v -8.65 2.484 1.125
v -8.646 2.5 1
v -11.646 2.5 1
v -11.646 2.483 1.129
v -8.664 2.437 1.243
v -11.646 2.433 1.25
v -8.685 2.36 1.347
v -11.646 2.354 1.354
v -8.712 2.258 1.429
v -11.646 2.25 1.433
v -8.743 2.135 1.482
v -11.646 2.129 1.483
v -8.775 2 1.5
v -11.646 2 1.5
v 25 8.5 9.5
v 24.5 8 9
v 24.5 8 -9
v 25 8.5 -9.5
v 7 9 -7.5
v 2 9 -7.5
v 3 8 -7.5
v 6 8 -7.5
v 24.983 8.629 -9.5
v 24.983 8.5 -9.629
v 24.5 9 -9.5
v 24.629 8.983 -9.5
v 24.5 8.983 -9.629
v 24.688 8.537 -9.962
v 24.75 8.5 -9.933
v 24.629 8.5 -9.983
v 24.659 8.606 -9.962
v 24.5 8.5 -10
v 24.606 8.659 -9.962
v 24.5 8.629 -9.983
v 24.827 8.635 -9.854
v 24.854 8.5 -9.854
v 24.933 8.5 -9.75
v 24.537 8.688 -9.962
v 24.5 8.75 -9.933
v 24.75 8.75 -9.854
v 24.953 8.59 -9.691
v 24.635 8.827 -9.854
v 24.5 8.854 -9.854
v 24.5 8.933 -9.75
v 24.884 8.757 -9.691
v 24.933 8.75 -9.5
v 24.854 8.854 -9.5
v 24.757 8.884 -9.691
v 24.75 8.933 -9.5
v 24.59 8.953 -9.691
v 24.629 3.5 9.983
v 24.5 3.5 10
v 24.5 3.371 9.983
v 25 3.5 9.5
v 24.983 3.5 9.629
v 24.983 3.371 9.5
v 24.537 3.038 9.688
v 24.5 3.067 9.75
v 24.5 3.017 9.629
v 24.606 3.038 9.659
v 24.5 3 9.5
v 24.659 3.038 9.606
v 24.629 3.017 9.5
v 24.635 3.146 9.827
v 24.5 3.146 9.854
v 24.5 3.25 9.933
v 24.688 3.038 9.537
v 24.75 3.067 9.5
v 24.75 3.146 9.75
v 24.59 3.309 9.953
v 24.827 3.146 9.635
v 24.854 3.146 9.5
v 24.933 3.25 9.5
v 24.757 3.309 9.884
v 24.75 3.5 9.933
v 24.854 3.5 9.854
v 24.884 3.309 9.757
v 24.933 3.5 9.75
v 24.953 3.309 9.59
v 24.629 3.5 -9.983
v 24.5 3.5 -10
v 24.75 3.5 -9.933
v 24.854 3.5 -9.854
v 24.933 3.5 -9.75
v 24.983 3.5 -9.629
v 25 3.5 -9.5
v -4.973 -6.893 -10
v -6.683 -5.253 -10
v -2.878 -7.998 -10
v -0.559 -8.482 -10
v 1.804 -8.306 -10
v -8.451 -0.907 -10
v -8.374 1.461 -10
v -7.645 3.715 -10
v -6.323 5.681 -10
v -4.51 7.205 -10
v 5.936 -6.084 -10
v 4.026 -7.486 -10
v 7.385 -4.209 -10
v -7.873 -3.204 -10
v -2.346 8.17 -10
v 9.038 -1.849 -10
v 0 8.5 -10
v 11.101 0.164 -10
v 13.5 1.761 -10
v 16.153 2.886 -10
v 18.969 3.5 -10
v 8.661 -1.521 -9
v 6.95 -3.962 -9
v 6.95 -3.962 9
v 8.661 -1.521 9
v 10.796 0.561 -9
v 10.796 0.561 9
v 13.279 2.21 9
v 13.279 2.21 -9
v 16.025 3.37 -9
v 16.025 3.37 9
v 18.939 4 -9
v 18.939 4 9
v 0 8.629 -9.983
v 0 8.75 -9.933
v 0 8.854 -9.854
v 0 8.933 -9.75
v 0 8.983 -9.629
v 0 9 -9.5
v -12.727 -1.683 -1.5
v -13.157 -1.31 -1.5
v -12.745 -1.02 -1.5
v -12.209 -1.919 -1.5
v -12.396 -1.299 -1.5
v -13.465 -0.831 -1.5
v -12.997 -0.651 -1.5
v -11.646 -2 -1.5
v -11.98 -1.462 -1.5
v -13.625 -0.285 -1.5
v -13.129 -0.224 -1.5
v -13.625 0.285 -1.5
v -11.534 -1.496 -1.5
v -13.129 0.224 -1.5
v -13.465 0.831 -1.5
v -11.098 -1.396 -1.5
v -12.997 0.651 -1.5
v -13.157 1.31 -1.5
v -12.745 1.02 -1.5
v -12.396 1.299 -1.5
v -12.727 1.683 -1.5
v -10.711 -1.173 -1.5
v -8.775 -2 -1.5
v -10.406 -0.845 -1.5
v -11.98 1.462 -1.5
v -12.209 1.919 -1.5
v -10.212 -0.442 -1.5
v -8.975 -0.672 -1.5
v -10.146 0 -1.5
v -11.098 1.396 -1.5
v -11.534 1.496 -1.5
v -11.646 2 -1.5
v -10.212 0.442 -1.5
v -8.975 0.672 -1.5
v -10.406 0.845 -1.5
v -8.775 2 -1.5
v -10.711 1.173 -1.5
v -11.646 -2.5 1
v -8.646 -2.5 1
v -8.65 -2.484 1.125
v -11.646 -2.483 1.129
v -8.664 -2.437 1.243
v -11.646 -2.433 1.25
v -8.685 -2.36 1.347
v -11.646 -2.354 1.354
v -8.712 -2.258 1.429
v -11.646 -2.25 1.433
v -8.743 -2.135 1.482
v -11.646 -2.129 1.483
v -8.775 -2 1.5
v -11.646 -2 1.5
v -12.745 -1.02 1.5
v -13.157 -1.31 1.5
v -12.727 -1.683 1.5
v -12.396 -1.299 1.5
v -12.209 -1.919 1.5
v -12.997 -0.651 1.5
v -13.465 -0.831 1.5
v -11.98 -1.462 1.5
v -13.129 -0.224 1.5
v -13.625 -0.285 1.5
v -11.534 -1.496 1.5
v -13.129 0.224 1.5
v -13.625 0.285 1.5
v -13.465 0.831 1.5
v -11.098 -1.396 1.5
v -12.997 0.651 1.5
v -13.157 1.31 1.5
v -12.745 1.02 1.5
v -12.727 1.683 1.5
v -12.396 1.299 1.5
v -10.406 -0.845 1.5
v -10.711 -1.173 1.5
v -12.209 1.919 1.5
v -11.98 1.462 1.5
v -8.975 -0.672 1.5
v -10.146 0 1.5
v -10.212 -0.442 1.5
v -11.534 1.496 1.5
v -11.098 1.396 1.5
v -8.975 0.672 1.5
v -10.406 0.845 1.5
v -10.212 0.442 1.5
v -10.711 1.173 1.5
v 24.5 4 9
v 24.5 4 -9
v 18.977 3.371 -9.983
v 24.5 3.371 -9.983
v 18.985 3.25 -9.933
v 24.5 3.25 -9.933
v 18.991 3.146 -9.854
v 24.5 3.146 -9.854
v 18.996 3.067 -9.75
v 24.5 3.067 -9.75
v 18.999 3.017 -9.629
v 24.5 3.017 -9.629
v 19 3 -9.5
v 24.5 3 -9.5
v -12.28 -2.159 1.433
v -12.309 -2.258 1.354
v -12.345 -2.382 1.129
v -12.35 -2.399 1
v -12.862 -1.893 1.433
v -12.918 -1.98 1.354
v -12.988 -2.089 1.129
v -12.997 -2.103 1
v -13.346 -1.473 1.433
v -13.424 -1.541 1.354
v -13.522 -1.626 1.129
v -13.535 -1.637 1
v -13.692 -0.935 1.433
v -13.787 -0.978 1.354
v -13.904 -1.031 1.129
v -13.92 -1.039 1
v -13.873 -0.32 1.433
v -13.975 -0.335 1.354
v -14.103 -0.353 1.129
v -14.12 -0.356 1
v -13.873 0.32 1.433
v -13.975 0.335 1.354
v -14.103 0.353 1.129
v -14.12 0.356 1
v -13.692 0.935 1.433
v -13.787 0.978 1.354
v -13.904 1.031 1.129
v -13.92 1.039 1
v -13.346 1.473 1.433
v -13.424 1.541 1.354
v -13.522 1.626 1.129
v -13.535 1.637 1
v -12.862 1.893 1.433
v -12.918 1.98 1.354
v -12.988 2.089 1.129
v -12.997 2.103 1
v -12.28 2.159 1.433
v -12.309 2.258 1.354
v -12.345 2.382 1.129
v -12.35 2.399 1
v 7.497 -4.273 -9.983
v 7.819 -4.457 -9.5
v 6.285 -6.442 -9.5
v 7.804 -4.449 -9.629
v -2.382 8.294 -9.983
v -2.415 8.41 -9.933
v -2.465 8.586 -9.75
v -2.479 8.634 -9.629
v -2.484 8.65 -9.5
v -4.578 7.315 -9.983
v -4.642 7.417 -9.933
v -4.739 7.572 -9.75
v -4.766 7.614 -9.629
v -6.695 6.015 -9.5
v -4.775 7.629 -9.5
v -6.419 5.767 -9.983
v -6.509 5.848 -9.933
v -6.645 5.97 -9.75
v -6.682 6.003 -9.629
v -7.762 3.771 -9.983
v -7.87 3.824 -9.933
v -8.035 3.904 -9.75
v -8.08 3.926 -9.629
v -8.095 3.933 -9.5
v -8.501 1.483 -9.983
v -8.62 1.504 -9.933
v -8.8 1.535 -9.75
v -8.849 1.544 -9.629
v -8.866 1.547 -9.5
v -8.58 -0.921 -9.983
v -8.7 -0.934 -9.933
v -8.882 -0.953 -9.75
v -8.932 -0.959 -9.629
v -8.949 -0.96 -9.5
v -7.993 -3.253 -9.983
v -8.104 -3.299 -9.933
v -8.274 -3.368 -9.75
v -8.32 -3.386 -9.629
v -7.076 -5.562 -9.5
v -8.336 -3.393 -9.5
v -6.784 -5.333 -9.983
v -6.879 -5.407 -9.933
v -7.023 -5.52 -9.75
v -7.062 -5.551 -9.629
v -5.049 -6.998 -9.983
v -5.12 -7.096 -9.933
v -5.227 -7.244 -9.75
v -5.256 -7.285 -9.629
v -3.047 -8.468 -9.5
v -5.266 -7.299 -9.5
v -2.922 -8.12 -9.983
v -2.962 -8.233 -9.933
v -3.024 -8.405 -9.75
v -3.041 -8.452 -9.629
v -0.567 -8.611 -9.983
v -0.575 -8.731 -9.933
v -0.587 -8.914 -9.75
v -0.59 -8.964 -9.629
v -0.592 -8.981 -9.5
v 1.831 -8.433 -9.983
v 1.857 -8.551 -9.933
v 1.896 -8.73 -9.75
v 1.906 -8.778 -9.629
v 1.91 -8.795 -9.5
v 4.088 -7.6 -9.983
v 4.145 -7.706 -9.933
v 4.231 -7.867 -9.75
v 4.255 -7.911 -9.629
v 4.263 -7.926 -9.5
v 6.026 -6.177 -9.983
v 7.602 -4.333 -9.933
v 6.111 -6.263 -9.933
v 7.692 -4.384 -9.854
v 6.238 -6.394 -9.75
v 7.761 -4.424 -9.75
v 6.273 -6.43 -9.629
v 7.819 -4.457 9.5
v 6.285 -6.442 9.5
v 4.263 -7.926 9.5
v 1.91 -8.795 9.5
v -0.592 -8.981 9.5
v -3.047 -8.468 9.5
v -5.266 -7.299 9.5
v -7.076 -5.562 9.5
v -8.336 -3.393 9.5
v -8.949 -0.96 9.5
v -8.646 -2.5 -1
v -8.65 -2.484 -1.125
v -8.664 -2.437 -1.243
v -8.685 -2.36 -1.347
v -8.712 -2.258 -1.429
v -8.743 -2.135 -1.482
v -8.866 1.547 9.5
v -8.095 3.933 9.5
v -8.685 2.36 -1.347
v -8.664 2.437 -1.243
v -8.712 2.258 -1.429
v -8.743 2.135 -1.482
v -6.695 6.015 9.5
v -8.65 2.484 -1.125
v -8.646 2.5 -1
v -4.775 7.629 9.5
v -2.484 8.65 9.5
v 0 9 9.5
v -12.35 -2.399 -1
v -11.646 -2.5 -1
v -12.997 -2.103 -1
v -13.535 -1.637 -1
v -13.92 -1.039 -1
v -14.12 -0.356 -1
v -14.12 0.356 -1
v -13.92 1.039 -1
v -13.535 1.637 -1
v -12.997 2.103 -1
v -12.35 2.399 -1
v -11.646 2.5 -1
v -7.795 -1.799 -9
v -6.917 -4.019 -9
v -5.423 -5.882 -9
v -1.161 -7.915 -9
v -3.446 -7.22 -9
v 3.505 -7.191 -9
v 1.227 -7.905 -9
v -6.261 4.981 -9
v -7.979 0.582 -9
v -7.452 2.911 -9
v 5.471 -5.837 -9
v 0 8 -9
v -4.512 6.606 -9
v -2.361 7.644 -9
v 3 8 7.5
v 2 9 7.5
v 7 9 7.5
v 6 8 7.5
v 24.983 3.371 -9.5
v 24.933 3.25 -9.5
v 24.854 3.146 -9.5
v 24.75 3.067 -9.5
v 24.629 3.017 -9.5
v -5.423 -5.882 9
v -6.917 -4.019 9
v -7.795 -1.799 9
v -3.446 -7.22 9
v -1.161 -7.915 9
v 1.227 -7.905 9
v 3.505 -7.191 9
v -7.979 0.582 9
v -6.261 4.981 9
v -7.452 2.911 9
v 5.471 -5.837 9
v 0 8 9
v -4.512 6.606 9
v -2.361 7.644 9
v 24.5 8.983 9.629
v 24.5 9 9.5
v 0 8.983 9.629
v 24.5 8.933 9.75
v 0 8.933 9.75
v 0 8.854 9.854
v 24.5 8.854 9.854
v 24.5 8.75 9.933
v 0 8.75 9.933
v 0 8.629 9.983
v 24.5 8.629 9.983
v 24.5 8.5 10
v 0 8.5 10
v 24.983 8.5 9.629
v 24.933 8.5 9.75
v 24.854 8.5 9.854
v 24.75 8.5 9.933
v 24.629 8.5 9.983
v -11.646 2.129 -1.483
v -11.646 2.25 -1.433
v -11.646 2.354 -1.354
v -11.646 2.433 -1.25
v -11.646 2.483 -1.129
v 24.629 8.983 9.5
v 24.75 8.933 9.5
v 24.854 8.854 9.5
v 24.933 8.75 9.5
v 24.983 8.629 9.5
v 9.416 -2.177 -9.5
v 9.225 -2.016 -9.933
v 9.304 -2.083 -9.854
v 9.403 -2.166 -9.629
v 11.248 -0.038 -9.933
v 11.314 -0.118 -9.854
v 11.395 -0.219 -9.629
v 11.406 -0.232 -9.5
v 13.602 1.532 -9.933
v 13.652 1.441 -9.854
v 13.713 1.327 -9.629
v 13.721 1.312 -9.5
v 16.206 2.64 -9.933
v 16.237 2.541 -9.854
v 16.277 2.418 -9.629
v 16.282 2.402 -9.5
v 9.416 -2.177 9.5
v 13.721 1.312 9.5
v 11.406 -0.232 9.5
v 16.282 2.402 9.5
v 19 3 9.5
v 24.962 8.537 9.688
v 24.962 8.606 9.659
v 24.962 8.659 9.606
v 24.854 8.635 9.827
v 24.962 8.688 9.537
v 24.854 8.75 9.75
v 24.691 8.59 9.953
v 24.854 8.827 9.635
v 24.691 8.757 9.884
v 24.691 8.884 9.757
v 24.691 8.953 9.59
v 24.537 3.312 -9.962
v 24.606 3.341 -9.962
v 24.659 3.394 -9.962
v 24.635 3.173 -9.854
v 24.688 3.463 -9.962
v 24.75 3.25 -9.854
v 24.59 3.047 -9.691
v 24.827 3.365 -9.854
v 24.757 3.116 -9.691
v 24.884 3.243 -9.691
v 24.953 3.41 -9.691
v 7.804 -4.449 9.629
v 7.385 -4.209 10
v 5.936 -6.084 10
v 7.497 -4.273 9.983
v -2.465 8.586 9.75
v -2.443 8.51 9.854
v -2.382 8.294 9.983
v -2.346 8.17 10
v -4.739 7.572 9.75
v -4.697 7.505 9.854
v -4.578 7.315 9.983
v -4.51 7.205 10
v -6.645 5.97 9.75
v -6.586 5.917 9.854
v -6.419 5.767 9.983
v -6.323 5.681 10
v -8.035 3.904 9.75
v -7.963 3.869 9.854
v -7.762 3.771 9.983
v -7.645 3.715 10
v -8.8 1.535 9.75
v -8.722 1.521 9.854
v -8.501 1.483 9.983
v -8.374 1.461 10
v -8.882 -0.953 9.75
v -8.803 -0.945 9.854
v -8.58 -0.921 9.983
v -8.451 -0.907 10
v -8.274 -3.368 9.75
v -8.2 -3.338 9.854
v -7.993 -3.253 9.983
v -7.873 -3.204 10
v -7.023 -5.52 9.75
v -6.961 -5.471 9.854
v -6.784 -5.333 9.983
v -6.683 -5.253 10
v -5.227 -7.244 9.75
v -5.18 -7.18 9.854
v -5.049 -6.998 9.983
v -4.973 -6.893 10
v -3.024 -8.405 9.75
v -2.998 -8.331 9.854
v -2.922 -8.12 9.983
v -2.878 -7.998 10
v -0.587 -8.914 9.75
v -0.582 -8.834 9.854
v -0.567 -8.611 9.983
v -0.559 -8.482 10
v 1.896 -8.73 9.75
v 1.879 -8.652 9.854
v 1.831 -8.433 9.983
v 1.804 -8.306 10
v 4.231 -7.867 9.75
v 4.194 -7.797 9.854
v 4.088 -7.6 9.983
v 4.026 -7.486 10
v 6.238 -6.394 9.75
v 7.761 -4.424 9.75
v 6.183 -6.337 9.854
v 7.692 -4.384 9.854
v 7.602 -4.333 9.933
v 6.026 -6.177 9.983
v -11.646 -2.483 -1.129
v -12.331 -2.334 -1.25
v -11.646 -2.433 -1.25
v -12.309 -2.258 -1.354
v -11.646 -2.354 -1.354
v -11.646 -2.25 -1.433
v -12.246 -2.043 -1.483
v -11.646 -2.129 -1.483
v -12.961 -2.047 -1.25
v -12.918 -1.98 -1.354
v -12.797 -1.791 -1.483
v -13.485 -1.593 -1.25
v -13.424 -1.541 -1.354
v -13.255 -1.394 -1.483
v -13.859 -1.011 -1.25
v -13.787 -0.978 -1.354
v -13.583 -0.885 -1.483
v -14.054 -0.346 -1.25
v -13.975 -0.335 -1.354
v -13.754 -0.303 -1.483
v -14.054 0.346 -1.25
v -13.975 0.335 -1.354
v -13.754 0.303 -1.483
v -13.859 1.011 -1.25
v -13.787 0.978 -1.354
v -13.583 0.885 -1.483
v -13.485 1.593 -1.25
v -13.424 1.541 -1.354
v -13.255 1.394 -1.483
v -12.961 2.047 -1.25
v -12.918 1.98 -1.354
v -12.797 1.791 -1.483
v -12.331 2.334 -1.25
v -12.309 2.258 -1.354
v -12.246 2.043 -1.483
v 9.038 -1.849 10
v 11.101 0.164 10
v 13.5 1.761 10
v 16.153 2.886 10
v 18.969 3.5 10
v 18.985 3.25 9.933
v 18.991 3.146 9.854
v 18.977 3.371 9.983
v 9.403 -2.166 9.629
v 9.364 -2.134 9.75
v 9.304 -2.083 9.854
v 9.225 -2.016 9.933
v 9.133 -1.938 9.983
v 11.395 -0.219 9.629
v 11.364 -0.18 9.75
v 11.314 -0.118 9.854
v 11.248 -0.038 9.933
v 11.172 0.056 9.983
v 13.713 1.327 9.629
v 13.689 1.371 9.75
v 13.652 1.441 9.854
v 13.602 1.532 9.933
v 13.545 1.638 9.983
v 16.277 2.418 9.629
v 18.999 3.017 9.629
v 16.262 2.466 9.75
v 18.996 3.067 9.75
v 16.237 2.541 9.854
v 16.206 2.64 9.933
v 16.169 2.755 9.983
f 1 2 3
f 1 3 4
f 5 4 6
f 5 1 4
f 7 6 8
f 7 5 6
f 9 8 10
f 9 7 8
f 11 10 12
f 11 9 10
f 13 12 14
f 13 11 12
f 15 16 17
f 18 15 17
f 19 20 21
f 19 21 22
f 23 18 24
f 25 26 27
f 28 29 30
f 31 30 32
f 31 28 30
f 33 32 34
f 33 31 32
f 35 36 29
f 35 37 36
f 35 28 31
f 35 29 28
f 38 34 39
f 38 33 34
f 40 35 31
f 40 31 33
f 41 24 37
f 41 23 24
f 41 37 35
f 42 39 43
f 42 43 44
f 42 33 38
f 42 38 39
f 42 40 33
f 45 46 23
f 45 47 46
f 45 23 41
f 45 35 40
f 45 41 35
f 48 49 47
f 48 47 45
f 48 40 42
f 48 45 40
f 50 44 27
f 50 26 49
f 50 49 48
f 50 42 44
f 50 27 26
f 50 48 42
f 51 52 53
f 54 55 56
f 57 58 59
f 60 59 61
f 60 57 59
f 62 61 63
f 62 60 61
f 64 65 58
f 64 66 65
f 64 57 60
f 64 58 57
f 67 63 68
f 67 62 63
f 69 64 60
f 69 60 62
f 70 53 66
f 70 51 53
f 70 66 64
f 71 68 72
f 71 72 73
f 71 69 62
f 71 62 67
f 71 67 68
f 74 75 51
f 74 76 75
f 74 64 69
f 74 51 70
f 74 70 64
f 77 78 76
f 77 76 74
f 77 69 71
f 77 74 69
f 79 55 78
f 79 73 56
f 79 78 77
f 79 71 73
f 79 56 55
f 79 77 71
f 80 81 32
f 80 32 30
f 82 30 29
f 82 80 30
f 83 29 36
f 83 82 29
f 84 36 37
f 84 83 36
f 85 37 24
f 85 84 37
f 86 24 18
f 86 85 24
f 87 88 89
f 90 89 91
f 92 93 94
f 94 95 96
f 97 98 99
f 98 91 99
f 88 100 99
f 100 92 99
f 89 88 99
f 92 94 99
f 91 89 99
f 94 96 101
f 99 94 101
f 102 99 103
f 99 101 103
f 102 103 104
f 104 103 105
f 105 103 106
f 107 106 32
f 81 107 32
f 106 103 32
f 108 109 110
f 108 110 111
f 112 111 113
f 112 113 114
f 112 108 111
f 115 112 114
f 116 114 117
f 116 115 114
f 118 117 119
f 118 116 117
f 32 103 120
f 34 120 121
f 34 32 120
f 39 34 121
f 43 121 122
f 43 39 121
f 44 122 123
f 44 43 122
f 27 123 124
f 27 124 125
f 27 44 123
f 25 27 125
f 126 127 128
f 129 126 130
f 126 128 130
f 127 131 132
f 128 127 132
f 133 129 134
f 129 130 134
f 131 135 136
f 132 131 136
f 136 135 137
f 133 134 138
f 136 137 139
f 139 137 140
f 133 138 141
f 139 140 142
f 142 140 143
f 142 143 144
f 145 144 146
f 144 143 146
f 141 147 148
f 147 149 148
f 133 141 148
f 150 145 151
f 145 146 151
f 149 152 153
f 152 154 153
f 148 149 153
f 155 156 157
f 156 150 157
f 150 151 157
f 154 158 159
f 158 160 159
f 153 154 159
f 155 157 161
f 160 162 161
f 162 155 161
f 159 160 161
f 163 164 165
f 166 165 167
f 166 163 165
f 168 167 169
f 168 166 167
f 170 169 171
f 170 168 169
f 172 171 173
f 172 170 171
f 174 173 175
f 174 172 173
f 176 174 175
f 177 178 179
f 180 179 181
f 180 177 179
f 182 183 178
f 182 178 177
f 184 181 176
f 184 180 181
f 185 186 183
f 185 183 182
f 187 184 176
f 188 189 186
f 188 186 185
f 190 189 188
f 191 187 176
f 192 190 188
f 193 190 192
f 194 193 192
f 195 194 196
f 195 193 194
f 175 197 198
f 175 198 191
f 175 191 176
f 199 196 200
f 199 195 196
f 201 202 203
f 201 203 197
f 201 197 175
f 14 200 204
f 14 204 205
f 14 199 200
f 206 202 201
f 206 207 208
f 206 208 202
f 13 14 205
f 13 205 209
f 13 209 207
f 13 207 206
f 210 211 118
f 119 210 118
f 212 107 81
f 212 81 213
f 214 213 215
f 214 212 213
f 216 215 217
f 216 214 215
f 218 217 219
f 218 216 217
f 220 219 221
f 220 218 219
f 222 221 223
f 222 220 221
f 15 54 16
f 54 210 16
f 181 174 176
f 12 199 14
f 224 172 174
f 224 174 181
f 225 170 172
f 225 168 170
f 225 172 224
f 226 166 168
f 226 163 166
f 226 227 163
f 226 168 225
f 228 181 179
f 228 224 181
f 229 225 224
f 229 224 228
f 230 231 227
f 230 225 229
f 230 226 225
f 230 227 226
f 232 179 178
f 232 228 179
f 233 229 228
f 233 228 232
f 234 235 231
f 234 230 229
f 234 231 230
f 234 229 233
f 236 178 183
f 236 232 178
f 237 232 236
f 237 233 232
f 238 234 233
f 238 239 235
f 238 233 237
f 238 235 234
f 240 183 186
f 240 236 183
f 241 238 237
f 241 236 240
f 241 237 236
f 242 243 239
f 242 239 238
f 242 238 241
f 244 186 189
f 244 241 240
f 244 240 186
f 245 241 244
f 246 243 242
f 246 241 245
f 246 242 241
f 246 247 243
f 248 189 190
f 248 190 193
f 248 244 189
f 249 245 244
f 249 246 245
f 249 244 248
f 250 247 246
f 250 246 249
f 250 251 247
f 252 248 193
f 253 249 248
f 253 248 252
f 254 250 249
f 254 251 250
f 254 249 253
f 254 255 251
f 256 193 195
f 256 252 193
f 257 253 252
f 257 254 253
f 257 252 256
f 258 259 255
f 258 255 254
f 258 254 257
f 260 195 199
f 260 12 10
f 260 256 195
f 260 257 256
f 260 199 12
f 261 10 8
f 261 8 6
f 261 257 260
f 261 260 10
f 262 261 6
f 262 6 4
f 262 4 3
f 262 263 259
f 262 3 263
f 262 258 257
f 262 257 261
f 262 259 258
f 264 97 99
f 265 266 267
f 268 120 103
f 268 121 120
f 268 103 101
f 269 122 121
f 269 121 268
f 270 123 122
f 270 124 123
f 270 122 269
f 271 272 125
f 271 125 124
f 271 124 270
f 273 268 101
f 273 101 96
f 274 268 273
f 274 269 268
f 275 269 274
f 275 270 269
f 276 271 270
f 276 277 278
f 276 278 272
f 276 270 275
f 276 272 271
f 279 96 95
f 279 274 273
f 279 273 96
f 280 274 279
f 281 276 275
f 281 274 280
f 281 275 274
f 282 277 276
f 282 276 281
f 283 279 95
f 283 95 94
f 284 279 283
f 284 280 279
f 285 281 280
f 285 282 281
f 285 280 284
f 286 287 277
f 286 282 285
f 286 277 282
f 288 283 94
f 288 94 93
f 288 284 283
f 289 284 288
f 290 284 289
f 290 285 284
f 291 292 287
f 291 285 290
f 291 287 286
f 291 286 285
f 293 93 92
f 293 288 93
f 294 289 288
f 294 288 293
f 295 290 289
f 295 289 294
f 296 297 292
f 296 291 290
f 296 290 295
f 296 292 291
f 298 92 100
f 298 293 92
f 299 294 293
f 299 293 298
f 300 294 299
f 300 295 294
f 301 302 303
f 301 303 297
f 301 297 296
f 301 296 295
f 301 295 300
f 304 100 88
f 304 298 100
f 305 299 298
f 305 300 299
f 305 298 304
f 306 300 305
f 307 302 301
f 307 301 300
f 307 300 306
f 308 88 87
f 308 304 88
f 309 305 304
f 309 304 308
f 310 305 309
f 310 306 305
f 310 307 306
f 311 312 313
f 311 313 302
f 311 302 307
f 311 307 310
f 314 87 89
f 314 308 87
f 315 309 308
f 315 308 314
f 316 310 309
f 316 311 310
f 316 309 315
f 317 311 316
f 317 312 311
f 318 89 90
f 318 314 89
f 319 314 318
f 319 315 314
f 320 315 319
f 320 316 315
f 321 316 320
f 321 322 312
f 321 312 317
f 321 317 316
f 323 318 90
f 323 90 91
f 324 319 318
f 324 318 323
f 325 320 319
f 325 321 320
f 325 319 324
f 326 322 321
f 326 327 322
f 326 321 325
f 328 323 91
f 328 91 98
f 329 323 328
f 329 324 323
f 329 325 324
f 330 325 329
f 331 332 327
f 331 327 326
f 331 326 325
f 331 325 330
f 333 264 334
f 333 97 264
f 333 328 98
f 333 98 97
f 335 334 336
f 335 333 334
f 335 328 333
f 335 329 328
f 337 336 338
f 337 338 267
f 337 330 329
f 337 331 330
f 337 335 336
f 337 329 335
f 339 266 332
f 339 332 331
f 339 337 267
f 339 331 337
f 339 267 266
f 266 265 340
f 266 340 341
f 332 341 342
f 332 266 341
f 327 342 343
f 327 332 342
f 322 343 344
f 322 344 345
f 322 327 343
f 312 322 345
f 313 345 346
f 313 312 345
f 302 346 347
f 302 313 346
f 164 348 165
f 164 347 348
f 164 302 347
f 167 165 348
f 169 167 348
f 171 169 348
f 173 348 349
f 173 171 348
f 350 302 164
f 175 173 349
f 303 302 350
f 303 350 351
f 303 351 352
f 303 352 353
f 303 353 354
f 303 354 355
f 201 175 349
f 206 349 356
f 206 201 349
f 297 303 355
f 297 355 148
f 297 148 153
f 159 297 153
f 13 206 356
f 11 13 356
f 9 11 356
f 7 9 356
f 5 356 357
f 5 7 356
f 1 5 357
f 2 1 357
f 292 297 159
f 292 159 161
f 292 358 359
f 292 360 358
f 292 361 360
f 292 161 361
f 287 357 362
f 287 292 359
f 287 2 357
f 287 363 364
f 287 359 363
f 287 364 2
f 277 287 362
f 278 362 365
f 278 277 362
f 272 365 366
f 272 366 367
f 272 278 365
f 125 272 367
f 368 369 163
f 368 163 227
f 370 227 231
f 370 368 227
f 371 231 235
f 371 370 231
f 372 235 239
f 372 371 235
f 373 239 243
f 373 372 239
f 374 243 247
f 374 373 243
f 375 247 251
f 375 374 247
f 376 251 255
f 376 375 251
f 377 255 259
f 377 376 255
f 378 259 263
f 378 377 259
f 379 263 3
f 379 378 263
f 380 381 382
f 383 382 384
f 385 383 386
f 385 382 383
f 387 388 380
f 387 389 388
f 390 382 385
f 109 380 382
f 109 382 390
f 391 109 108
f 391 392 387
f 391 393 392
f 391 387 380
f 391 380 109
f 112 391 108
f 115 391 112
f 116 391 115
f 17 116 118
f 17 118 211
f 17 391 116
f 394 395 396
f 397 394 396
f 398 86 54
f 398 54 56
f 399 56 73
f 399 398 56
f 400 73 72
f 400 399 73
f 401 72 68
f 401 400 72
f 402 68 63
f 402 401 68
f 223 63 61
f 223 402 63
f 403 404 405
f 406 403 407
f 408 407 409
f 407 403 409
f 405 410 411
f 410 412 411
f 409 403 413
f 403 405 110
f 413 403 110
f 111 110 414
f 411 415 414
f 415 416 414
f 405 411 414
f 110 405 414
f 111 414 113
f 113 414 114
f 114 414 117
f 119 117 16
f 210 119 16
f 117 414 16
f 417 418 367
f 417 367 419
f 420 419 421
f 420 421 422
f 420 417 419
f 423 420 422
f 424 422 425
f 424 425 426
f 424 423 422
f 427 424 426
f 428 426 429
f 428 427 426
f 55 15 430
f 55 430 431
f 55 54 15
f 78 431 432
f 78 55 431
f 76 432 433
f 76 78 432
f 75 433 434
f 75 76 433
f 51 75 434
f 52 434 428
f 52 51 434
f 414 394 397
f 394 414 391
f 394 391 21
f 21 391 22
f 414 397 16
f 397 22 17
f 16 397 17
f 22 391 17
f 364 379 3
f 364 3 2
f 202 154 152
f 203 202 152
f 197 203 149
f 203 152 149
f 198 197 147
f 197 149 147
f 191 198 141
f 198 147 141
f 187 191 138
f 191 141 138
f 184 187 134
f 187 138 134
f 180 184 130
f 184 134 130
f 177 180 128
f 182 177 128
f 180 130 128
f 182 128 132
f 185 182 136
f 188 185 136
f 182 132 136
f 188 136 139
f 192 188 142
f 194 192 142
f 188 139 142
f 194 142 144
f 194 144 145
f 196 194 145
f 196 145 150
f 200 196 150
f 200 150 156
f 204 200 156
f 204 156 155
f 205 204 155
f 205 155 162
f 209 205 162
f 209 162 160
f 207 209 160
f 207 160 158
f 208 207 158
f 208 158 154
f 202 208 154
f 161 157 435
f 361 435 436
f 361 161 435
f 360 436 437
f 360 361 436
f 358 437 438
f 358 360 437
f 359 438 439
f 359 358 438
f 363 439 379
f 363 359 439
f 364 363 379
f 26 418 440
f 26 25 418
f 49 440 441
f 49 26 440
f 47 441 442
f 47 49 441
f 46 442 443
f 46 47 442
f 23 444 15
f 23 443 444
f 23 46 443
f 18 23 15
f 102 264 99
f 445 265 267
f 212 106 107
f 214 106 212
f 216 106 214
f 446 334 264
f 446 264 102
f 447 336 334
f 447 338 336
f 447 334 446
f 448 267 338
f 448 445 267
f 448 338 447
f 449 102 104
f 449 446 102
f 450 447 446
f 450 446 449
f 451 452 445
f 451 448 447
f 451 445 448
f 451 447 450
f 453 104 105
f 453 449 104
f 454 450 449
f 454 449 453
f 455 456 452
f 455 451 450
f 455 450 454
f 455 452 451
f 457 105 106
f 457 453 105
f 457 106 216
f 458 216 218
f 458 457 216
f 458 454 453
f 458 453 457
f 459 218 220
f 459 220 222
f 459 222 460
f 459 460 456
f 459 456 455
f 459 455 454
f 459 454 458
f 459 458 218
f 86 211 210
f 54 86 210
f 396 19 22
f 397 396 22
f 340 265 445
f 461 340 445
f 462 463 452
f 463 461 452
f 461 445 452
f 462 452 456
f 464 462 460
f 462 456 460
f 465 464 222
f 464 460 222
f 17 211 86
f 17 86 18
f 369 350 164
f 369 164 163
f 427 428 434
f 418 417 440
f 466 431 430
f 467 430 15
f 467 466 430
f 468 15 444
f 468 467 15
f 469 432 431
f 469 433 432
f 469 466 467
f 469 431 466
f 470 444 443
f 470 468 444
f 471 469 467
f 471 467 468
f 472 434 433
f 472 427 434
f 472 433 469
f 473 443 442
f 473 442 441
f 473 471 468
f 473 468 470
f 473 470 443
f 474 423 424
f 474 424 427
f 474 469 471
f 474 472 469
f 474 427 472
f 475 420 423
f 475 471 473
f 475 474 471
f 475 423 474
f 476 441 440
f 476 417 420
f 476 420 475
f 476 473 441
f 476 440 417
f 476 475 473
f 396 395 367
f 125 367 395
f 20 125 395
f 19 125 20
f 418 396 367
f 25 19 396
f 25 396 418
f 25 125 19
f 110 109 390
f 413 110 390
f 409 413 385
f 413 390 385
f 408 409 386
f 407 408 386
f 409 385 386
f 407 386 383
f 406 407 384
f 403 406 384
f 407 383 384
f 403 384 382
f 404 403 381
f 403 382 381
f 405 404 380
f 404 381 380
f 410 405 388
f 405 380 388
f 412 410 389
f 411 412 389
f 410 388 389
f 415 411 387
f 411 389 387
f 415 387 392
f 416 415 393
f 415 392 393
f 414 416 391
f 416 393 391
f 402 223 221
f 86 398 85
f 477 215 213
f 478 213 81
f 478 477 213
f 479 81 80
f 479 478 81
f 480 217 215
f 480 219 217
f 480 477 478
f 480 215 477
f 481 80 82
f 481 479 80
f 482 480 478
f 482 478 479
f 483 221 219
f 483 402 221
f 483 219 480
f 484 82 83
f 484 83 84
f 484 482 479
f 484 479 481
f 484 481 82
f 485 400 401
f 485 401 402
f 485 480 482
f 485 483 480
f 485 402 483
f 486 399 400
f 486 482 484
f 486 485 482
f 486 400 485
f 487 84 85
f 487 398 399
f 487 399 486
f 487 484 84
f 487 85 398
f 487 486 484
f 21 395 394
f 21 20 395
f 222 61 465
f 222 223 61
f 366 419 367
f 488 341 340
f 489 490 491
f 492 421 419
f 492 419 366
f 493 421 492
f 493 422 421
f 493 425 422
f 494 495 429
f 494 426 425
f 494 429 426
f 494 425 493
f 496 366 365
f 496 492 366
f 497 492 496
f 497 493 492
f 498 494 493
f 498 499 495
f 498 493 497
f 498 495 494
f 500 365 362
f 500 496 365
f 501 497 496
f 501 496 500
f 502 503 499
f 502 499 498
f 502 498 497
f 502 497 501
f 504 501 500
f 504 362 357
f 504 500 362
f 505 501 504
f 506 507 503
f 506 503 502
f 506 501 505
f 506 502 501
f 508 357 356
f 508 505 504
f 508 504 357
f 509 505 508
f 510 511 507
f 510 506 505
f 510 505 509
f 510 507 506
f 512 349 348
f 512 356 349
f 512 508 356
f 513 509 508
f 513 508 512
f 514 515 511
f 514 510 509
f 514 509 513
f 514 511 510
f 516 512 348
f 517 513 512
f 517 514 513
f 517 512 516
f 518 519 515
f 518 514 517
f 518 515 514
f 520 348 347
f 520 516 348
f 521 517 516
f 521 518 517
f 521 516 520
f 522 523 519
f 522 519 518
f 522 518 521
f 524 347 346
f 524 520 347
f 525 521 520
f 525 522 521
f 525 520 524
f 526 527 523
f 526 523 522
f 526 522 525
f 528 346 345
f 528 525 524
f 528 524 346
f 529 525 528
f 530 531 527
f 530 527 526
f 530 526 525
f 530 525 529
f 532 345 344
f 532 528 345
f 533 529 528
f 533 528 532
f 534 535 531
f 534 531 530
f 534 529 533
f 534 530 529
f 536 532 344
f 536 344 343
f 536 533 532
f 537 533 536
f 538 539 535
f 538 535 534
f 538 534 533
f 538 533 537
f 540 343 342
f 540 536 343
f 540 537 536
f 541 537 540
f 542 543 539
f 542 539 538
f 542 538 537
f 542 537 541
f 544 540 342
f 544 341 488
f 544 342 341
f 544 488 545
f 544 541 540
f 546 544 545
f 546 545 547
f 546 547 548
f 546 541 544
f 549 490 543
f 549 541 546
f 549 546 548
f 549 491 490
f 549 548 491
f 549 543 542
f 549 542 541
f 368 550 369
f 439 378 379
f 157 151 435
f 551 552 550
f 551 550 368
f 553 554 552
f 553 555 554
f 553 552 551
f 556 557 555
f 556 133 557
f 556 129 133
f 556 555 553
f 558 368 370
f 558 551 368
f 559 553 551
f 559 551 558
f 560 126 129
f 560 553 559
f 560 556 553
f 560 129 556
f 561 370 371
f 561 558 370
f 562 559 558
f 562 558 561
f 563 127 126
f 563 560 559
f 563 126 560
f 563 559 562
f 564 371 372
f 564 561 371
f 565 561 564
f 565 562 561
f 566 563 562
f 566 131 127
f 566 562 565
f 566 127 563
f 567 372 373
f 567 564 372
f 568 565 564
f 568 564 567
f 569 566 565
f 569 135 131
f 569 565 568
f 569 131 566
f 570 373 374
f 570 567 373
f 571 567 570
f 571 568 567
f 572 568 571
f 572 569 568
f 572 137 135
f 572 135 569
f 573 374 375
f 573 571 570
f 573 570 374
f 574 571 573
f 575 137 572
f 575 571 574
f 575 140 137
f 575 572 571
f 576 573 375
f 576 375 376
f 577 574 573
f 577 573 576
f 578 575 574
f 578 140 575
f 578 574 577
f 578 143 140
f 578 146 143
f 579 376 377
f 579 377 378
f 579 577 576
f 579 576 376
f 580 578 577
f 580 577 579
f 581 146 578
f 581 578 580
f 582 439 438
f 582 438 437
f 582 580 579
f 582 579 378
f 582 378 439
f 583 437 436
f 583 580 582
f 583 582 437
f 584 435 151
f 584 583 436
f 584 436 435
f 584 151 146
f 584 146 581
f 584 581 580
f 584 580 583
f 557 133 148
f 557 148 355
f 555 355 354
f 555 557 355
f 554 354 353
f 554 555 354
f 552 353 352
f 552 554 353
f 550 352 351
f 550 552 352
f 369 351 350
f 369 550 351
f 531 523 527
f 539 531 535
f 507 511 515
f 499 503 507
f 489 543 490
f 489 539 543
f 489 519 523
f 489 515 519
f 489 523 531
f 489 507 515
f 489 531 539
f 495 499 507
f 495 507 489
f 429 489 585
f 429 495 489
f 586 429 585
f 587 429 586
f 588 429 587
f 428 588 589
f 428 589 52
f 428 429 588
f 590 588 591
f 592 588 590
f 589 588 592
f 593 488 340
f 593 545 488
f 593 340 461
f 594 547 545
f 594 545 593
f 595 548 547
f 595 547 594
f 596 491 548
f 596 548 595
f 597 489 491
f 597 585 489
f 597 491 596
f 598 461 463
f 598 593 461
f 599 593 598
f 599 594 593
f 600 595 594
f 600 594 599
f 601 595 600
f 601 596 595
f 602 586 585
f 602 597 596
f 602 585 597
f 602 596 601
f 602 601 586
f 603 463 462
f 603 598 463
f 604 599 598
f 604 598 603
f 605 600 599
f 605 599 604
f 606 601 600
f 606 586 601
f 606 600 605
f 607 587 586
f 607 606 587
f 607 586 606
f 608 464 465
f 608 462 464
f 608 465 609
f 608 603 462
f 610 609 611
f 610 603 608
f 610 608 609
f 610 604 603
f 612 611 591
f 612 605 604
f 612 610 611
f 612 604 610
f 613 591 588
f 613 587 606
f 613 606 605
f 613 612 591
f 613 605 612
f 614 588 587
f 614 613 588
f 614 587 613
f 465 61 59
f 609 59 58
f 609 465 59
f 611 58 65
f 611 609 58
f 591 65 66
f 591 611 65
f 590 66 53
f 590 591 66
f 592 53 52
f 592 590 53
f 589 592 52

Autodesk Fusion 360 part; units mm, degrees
sketch "Sketch1" plane through (0, 0, 0) normal (0, 0, 1) x (1, 0, 0)
  circle A0 centre (0, 0) radius 9
  line L0 (0, 9) -> (25, 9)
  line L1 (25, 9) -> (25, 3)
  line L2 (25, 3) -> (19, 3)
  arc A1 (19, 3) -> (7.8189, -4.457) centre (20.8503, -11.8854) ccw
  dimension "d1" = 18
  dimension "d2" = 25
  dimension "d3" = 6
  dimension "d4" = 6
  dimension "d5" = 15
extrude "Extrude1" add sketch "Sketch1" along normal mid plane 20
shell "Shell1" thickness 1 removed faces 1 at (25, 7, 3.3333)
sketch "Sketch2" plane through (0, 0, 0) normal (0, 0, 1) x (1, 0, 0)
  line L0 (0, 9) -> (25, 9)
  line L1 (0, 8) -> (25, 8)
  line L2 (2, 9) -> (3, 8)
  line L3 (2, 9) -> (1.4972, 9) construction
  line L4 (7, 9) -> (6, 8)
  line L5 (7, 9) -> (6.4972, 9) construction
  dimension "d9" = 45
  dimension "d10" = 135
  dimension "d11" = 3
  dimension "d12" = 2
extrude "Extrude2" cut sketch "Sketch2" along normal mid plane 15
sketch "Sketch3" plane through (0, 0, 0) normal (0, 0, 1) x (1, 0, 0)
  line L0 (-11.6458, 2.5) -> (-8.6458, 2.5)
  line L1 (-8.6458, 2.5) -> (-8.6458, -2.5)
  line L2 (-8.6458, -2.5) -> (-11.6458, -2.5)
  line L3 (-11.6458, -2.5) -> (-11.6458, 2.5)
  arc A0 (0, 9) -> (7.8189, -4.457) centre (0, 0) ccw
  arc A1 (-11.6458, 2.5) -> (-11.6458, -2.5) centre (-11.6458, 0) ccw
  circle A2 centre (-11.6458, 0) radius 1.5
  dimension "d15" = 3
  dimension "d16" = 5
  dimension "d17" = 3
extrude "Extrude3" add sketch "Sketch3" along normal mid plane 3 contours L0 L2 L3 A0 A2 | L3 A1 A2
fillet "Fillet1" radius 0.5 18 edges at (12.5, 9, 10) (-7.7818, -4.5214, 10) (12.5275, 0.5938, 10) (25, 9, 0) (25, 6, 10) (22, 3, 10) (25, 3, 0) (25, 6, -10) (12.5275, 0.5938, -10) (-7.7818, -4.5214, -10) (12.5, 9, -10) (22, 3, -10) (-10.1458, 2.5, 1.5) (-14.1458, 0, 1.5) (-10.1458, -2.5, 1.5) (-10.1458, -2.5, -1.5) (-14.1458, 0, -1.5) (-10.1458, 2.5, -1.5)
chamfer "Chamfer1" distance 0.5 angle 45 4 edges at (25, 4, 0) (25, 6, -9) (25, 8, 0) (25, 6, 9)
